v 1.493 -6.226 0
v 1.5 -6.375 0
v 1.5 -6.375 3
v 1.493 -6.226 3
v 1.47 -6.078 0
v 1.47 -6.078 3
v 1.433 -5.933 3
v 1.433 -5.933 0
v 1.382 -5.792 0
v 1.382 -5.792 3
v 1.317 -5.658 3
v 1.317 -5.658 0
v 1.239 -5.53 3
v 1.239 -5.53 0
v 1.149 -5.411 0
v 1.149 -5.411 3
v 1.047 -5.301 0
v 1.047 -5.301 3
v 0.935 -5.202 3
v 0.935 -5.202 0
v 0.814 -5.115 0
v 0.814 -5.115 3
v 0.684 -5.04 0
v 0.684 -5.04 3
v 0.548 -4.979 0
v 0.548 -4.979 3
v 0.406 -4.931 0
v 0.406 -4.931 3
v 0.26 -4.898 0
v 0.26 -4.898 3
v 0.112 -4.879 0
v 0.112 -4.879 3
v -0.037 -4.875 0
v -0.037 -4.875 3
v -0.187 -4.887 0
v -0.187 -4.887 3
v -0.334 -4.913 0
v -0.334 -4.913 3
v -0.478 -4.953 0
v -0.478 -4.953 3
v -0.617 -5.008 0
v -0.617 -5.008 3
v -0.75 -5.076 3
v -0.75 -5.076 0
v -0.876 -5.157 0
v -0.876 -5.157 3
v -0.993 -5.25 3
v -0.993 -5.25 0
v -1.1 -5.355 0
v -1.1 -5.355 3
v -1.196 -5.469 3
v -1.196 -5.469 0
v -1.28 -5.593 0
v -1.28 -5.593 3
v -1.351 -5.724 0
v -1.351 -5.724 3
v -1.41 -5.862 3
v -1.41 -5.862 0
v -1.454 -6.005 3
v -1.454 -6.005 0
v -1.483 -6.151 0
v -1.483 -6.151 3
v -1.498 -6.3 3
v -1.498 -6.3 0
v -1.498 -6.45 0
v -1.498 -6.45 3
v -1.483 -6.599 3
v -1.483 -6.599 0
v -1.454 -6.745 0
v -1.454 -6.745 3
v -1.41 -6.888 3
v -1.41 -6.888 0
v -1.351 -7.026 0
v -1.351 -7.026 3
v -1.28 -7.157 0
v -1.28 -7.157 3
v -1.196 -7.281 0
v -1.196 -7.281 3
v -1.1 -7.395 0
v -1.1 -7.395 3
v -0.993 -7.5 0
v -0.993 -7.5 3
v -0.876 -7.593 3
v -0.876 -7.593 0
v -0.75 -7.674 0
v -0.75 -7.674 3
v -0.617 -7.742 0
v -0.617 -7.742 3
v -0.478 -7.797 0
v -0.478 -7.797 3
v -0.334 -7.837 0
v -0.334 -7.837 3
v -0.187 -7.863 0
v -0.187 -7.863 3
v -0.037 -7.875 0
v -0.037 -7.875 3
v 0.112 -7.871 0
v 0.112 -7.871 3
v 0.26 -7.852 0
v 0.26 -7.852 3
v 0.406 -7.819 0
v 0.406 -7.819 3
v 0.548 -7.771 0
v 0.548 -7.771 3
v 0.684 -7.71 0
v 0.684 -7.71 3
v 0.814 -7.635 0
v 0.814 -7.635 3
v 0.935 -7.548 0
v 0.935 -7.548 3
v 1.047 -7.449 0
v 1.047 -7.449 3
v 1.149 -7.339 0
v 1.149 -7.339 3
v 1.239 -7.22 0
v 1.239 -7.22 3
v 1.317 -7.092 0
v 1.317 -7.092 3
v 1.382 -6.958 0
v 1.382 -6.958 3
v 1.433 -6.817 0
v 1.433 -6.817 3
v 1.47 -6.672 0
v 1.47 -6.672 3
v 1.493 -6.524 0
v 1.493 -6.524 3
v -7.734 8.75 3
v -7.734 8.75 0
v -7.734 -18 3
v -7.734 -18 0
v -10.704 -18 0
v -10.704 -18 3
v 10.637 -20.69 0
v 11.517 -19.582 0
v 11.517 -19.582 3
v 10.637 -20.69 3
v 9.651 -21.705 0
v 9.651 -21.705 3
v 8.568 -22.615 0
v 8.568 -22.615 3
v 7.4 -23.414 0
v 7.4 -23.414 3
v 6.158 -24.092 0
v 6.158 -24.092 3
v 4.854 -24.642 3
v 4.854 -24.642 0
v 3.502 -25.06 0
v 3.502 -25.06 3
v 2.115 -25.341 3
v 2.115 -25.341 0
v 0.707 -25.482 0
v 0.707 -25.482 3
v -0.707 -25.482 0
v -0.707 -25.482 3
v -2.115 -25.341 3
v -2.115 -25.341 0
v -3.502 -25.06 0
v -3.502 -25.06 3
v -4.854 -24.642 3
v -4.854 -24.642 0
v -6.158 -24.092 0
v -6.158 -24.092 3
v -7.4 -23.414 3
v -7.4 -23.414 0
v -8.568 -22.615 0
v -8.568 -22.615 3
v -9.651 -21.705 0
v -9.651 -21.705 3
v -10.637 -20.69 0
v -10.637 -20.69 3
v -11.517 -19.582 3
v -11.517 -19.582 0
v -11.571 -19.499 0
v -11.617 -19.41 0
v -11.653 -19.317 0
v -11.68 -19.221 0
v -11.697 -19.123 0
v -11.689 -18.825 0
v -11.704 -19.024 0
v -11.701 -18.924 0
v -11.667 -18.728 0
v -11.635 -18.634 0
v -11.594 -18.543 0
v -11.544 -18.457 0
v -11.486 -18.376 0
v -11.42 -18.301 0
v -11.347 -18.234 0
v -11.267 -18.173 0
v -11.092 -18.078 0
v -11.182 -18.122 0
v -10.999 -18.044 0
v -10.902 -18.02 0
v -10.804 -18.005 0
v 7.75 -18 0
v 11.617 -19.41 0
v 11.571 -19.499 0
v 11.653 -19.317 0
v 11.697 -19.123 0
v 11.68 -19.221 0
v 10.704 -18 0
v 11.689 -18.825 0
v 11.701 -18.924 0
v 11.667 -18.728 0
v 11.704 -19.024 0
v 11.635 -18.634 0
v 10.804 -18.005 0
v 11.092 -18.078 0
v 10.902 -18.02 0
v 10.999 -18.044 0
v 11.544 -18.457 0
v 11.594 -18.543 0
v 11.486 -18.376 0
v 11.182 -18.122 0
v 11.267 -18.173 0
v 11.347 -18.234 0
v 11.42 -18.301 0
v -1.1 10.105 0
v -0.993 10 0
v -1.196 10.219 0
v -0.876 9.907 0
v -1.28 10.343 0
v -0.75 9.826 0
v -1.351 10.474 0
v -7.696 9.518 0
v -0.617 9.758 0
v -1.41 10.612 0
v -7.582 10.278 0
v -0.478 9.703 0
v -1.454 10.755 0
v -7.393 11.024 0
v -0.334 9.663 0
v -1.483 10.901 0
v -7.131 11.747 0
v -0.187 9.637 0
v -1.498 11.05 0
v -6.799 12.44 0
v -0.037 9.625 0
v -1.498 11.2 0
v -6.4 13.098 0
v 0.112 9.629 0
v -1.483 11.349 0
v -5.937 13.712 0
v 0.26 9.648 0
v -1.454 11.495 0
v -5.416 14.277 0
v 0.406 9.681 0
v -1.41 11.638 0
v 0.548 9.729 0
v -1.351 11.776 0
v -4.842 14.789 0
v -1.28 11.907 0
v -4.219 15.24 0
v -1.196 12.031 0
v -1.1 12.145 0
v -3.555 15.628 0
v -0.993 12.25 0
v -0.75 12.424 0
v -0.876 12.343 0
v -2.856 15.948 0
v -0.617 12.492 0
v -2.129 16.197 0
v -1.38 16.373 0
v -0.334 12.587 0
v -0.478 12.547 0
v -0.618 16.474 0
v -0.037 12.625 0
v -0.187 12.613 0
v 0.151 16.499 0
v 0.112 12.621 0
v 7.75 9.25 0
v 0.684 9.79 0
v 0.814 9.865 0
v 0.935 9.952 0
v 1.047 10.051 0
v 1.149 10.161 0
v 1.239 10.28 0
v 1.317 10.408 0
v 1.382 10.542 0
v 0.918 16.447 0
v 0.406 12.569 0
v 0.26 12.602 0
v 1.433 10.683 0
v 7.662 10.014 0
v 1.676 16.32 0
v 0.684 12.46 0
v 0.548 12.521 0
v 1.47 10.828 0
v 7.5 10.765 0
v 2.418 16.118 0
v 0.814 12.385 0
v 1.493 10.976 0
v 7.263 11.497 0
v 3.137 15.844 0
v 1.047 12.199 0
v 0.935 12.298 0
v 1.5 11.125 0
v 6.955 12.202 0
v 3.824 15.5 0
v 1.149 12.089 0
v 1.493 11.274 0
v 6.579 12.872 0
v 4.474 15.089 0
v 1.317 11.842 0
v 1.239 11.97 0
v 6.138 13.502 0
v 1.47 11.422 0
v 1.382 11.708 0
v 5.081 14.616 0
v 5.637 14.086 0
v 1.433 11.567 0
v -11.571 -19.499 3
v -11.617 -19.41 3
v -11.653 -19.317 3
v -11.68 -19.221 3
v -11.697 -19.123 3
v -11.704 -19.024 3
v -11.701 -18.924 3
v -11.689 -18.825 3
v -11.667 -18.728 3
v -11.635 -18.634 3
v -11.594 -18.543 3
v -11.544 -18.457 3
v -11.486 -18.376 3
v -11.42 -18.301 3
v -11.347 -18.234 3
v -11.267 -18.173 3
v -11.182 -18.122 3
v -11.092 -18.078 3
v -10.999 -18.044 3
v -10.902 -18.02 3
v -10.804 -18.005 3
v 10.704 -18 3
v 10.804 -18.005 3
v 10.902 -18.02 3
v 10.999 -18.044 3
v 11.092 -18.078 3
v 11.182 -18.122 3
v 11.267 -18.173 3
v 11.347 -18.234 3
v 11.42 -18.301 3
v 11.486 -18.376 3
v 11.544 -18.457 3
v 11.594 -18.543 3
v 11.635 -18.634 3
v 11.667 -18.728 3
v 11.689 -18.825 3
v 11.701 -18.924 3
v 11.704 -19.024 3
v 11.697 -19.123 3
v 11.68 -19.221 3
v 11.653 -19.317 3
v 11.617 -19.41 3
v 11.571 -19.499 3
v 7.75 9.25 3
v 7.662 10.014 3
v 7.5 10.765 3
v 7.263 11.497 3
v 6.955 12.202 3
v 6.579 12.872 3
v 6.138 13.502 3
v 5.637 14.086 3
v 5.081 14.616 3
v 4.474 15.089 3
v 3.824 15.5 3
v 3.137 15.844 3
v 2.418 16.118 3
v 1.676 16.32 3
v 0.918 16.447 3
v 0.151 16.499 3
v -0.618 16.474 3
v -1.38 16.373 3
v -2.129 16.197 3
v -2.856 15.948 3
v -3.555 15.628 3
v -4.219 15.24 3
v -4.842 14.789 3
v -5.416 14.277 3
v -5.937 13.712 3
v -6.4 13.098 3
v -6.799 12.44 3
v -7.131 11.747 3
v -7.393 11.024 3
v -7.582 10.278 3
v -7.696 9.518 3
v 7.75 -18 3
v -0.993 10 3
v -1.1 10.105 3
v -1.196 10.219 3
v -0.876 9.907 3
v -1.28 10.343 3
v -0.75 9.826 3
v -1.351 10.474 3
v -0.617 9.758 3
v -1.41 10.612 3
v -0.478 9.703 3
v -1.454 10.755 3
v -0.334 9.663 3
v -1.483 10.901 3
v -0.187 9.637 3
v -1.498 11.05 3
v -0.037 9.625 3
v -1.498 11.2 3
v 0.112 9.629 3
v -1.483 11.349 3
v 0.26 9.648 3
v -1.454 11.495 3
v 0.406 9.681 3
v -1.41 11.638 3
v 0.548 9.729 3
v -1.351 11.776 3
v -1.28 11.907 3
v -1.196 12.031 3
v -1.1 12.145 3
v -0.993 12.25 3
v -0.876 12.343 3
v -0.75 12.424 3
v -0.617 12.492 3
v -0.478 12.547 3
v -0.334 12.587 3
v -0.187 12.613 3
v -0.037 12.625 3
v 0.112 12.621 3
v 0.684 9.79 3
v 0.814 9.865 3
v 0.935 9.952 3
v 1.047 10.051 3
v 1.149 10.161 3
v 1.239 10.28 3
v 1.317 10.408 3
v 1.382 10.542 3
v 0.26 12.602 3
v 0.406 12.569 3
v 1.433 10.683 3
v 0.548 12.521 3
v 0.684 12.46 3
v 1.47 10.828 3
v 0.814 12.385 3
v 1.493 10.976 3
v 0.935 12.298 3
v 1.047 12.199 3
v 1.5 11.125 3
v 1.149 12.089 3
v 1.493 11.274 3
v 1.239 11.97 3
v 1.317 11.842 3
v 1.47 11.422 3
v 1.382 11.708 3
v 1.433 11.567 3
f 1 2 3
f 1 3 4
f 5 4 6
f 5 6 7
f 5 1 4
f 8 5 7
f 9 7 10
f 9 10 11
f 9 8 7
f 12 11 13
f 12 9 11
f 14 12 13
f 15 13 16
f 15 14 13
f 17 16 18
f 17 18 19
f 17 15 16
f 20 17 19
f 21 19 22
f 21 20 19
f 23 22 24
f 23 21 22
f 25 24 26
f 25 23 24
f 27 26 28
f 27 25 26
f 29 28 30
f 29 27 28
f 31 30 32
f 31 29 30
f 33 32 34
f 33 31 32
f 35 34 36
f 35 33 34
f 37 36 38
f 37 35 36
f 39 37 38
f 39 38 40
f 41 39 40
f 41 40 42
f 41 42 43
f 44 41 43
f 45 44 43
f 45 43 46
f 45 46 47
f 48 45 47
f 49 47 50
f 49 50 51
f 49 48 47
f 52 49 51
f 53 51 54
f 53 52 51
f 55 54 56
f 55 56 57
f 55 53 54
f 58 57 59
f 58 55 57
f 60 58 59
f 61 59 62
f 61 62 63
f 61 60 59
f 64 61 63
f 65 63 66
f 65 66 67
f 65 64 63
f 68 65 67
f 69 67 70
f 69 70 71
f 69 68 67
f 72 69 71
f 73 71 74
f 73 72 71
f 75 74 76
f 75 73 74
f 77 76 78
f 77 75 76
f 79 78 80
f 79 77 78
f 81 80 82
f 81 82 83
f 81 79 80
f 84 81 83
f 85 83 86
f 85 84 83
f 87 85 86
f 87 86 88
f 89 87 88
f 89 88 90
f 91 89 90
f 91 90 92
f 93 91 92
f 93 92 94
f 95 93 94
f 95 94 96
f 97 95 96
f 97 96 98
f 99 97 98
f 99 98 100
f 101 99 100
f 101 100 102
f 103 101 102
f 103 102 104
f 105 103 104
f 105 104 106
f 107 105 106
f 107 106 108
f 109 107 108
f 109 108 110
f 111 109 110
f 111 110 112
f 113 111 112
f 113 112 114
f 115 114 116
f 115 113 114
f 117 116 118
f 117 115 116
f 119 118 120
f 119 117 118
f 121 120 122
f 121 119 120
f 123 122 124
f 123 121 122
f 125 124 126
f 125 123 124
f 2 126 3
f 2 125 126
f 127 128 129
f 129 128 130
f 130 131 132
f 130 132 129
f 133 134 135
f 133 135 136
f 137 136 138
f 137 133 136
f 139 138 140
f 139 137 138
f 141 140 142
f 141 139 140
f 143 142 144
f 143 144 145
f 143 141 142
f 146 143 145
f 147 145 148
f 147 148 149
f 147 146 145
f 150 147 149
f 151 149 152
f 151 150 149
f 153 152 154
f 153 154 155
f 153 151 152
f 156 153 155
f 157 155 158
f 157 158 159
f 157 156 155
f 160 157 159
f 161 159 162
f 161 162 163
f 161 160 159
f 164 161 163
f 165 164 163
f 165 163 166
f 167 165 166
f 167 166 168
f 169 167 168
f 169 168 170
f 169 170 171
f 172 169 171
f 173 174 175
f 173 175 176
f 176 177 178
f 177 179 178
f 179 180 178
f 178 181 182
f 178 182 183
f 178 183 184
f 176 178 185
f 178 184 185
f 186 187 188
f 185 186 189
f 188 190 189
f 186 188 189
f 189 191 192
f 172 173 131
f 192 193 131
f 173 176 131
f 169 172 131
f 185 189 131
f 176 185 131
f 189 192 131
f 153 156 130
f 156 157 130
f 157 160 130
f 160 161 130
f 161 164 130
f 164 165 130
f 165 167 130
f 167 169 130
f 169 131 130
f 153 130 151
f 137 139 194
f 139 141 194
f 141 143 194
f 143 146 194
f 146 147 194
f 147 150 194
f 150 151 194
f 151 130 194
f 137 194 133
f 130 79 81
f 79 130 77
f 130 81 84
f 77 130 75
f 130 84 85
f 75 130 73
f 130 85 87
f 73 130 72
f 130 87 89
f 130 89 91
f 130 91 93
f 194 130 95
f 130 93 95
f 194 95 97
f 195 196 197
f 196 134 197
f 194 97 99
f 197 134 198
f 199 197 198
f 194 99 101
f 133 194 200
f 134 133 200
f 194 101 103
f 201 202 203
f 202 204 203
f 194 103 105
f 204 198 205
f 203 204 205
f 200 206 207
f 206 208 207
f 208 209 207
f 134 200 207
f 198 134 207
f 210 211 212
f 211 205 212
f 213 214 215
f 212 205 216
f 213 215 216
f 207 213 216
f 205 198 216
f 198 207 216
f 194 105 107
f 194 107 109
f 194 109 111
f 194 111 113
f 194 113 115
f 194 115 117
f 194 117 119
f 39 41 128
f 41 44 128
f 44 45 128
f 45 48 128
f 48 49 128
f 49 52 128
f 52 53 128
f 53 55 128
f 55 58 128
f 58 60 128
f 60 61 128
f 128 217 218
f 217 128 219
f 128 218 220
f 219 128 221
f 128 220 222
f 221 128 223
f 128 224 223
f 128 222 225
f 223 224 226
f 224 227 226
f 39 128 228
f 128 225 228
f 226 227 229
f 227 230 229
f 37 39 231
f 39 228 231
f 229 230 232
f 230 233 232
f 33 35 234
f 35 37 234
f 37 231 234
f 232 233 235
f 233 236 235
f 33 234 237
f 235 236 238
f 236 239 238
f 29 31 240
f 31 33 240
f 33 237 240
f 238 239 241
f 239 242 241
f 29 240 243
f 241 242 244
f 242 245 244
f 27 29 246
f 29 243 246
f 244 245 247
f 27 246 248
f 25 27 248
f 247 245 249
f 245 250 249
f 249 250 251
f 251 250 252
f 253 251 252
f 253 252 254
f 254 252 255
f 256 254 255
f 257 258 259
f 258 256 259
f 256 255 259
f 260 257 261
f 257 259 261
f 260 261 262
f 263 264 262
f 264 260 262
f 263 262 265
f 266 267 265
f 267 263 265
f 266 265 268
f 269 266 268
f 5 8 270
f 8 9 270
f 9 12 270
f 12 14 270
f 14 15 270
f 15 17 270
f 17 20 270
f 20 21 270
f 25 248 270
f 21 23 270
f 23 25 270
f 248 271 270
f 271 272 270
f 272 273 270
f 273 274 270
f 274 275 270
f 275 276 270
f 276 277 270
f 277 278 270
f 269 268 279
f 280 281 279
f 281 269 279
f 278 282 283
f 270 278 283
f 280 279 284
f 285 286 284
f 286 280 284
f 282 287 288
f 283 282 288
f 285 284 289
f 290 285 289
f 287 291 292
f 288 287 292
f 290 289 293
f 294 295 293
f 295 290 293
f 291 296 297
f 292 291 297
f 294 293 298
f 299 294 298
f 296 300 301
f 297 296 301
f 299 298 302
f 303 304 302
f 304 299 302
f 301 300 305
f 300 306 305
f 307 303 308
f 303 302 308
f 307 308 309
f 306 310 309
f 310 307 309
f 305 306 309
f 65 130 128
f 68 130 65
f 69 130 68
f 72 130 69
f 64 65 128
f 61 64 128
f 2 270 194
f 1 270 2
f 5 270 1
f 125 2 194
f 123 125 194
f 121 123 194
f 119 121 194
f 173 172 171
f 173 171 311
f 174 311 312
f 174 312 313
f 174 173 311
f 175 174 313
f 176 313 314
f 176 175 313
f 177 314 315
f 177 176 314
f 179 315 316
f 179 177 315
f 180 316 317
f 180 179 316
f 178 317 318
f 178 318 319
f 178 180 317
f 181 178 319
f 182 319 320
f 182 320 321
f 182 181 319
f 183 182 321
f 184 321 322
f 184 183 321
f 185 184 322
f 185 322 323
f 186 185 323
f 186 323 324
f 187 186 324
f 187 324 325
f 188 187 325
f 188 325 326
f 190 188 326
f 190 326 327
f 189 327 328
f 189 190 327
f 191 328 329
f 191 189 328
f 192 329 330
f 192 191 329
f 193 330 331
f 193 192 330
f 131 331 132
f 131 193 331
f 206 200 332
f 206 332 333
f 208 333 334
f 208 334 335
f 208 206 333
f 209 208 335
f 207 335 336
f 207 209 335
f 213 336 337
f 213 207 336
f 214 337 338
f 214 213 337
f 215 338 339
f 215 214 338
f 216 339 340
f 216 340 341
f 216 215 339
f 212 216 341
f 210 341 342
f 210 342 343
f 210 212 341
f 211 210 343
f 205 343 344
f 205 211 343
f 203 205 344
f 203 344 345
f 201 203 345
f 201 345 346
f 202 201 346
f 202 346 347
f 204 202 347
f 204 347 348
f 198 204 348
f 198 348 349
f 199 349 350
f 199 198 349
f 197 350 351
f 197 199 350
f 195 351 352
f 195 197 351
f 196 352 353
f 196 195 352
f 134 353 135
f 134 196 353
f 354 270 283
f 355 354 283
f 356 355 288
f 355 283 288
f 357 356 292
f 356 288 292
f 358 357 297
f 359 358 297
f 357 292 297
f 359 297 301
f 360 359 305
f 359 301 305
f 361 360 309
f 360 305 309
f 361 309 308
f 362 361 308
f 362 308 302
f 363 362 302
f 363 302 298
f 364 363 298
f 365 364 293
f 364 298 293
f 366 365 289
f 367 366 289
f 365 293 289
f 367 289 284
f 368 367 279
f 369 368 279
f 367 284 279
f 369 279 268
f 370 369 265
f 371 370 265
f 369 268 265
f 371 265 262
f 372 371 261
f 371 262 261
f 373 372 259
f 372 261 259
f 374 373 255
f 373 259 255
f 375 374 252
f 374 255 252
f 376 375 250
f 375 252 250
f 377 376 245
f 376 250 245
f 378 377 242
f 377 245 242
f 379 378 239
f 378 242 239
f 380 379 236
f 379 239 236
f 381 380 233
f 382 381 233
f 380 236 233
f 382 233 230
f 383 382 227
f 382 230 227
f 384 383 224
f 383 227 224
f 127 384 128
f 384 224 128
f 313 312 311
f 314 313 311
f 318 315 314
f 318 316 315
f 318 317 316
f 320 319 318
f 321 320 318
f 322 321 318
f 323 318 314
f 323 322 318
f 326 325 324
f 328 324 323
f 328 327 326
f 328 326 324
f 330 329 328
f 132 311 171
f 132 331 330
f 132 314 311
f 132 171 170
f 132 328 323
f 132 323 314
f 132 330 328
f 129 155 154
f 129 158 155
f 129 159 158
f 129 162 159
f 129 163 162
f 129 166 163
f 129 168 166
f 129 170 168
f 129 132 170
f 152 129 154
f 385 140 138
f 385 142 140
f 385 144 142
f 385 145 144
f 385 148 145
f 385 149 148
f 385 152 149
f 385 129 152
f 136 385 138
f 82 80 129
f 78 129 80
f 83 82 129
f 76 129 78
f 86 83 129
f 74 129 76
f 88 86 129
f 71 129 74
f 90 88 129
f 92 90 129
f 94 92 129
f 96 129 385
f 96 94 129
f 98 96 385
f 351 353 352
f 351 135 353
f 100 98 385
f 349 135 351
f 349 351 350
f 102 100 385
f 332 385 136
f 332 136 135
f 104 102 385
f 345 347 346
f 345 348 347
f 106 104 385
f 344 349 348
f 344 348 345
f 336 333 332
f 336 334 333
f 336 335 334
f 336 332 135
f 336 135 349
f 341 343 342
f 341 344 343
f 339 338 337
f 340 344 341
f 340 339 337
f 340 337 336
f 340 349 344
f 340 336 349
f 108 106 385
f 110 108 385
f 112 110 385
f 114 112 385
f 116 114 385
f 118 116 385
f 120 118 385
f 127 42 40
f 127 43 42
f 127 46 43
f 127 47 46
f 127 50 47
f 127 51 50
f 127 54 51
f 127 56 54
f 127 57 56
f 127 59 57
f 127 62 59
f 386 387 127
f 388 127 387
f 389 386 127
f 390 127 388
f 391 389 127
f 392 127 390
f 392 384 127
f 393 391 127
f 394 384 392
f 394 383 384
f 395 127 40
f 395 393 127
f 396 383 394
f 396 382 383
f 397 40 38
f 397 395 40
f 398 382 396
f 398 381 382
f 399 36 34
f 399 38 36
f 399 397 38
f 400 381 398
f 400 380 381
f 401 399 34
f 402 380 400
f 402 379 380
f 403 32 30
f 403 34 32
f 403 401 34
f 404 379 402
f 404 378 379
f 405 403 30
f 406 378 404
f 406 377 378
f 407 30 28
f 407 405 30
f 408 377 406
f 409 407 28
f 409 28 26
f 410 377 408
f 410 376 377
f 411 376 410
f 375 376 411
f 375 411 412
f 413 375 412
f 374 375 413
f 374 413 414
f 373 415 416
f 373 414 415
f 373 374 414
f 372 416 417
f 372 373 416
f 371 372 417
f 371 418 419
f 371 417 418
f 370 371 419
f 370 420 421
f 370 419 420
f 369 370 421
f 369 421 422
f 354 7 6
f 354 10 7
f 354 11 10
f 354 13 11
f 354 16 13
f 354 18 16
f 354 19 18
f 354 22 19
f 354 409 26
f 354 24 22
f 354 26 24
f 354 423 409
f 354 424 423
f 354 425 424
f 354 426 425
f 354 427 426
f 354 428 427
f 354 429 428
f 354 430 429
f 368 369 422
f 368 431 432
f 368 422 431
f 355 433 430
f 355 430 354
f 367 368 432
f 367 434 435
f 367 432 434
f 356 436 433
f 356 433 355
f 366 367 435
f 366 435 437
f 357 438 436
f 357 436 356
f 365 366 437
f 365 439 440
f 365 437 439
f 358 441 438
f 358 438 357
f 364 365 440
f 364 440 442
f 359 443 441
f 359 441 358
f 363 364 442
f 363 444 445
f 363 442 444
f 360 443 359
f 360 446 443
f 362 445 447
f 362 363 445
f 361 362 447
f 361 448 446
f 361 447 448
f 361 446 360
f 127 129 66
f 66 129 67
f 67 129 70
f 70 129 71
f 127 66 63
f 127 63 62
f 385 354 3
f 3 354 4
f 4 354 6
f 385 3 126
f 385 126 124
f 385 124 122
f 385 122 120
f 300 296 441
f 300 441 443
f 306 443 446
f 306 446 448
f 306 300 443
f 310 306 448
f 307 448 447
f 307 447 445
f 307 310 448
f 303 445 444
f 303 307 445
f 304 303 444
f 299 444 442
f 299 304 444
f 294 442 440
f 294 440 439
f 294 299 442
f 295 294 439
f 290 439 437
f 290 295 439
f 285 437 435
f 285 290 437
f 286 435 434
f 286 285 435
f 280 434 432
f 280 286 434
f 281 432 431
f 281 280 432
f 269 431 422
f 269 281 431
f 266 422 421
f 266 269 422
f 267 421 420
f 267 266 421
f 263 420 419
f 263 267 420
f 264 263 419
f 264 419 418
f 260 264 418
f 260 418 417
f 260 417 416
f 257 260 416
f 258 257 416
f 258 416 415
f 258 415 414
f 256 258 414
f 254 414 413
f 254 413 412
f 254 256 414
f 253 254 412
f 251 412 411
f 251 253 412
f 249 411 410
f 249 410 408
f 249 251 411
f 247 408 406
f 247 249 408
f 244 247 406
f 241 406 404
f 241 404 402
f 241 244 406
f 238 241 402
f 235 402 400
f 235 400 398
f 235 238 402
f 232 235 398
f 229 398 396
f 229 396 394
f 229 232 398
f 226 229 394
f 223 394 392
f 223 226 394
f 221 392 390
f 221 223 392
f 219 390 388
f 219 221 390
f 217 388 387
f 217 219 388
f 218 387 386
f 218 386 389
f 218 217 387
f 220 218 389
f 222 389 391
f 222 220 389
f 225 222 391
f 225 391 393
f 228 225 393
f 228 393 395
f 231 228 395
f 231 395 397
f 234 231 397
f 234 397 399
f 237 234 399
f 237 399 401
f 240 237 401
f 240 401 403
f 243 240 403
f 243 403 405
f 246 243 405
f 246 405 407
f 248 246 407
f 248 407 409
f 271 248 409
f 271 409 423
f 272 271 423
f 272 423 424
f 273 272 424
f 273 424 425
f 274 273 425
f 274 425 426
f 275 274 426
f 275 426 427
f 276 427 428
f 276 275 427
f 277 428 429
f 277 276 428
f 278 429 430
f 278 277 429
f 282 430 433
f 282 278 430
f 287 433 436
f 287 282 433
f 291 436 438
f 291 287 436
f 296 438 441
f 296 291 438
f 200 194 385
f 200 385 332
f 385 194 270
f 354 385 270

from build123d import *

# Parameters (mm, degrees)
SKETCH1_R           = 1.5
BOSS_EXTRUDE2_DEPTH = 3


with BuildPart() as part:
    # Sketch1 → Boss-Extrude2 (new body)
    with BuildSketch(Plane.XY):
        with BuildLine():
            Line((-7.733855236, 8.750016816), (-7.733855236, -18))
            Line((-7.733855236, -18), (7.75, -18))
            Line((7.75, -18), (7.75, 9.25))
            ThreePointArc((7.75, 9.25), (-0.233977125, 16.495979574), (-7.733855236, 8.750016816))
        make_face()
        with Locations((0, -6.375)):
            Circle(SKETCH1_R, mode=Mode.SUBTRACT)
        with Locations((0, 11.125)):
            Circle(SKETCH1_R, mode=Mode.SUBTRACT)
        with BuildLine():
            ThreePointArc((10.704360482, -18), (11.593820566, -18.542987134), (11.517349886, -19.582278481))
            ThreePointArc((11.517349886, -19.582278481), (0, -25.5), (-11.517349886, -19.582278481))
            ThreePointArc((-11.517349886, -19.582278481), (-11.593820566, -18.542987134), (-10.704360482, -18))
            Line((-10.704360482, -18), (10.704360482, -18))
        make_face()
    extrude(amount=BOSS_EXTRUDE2_DEPTH)


solid = part.part
